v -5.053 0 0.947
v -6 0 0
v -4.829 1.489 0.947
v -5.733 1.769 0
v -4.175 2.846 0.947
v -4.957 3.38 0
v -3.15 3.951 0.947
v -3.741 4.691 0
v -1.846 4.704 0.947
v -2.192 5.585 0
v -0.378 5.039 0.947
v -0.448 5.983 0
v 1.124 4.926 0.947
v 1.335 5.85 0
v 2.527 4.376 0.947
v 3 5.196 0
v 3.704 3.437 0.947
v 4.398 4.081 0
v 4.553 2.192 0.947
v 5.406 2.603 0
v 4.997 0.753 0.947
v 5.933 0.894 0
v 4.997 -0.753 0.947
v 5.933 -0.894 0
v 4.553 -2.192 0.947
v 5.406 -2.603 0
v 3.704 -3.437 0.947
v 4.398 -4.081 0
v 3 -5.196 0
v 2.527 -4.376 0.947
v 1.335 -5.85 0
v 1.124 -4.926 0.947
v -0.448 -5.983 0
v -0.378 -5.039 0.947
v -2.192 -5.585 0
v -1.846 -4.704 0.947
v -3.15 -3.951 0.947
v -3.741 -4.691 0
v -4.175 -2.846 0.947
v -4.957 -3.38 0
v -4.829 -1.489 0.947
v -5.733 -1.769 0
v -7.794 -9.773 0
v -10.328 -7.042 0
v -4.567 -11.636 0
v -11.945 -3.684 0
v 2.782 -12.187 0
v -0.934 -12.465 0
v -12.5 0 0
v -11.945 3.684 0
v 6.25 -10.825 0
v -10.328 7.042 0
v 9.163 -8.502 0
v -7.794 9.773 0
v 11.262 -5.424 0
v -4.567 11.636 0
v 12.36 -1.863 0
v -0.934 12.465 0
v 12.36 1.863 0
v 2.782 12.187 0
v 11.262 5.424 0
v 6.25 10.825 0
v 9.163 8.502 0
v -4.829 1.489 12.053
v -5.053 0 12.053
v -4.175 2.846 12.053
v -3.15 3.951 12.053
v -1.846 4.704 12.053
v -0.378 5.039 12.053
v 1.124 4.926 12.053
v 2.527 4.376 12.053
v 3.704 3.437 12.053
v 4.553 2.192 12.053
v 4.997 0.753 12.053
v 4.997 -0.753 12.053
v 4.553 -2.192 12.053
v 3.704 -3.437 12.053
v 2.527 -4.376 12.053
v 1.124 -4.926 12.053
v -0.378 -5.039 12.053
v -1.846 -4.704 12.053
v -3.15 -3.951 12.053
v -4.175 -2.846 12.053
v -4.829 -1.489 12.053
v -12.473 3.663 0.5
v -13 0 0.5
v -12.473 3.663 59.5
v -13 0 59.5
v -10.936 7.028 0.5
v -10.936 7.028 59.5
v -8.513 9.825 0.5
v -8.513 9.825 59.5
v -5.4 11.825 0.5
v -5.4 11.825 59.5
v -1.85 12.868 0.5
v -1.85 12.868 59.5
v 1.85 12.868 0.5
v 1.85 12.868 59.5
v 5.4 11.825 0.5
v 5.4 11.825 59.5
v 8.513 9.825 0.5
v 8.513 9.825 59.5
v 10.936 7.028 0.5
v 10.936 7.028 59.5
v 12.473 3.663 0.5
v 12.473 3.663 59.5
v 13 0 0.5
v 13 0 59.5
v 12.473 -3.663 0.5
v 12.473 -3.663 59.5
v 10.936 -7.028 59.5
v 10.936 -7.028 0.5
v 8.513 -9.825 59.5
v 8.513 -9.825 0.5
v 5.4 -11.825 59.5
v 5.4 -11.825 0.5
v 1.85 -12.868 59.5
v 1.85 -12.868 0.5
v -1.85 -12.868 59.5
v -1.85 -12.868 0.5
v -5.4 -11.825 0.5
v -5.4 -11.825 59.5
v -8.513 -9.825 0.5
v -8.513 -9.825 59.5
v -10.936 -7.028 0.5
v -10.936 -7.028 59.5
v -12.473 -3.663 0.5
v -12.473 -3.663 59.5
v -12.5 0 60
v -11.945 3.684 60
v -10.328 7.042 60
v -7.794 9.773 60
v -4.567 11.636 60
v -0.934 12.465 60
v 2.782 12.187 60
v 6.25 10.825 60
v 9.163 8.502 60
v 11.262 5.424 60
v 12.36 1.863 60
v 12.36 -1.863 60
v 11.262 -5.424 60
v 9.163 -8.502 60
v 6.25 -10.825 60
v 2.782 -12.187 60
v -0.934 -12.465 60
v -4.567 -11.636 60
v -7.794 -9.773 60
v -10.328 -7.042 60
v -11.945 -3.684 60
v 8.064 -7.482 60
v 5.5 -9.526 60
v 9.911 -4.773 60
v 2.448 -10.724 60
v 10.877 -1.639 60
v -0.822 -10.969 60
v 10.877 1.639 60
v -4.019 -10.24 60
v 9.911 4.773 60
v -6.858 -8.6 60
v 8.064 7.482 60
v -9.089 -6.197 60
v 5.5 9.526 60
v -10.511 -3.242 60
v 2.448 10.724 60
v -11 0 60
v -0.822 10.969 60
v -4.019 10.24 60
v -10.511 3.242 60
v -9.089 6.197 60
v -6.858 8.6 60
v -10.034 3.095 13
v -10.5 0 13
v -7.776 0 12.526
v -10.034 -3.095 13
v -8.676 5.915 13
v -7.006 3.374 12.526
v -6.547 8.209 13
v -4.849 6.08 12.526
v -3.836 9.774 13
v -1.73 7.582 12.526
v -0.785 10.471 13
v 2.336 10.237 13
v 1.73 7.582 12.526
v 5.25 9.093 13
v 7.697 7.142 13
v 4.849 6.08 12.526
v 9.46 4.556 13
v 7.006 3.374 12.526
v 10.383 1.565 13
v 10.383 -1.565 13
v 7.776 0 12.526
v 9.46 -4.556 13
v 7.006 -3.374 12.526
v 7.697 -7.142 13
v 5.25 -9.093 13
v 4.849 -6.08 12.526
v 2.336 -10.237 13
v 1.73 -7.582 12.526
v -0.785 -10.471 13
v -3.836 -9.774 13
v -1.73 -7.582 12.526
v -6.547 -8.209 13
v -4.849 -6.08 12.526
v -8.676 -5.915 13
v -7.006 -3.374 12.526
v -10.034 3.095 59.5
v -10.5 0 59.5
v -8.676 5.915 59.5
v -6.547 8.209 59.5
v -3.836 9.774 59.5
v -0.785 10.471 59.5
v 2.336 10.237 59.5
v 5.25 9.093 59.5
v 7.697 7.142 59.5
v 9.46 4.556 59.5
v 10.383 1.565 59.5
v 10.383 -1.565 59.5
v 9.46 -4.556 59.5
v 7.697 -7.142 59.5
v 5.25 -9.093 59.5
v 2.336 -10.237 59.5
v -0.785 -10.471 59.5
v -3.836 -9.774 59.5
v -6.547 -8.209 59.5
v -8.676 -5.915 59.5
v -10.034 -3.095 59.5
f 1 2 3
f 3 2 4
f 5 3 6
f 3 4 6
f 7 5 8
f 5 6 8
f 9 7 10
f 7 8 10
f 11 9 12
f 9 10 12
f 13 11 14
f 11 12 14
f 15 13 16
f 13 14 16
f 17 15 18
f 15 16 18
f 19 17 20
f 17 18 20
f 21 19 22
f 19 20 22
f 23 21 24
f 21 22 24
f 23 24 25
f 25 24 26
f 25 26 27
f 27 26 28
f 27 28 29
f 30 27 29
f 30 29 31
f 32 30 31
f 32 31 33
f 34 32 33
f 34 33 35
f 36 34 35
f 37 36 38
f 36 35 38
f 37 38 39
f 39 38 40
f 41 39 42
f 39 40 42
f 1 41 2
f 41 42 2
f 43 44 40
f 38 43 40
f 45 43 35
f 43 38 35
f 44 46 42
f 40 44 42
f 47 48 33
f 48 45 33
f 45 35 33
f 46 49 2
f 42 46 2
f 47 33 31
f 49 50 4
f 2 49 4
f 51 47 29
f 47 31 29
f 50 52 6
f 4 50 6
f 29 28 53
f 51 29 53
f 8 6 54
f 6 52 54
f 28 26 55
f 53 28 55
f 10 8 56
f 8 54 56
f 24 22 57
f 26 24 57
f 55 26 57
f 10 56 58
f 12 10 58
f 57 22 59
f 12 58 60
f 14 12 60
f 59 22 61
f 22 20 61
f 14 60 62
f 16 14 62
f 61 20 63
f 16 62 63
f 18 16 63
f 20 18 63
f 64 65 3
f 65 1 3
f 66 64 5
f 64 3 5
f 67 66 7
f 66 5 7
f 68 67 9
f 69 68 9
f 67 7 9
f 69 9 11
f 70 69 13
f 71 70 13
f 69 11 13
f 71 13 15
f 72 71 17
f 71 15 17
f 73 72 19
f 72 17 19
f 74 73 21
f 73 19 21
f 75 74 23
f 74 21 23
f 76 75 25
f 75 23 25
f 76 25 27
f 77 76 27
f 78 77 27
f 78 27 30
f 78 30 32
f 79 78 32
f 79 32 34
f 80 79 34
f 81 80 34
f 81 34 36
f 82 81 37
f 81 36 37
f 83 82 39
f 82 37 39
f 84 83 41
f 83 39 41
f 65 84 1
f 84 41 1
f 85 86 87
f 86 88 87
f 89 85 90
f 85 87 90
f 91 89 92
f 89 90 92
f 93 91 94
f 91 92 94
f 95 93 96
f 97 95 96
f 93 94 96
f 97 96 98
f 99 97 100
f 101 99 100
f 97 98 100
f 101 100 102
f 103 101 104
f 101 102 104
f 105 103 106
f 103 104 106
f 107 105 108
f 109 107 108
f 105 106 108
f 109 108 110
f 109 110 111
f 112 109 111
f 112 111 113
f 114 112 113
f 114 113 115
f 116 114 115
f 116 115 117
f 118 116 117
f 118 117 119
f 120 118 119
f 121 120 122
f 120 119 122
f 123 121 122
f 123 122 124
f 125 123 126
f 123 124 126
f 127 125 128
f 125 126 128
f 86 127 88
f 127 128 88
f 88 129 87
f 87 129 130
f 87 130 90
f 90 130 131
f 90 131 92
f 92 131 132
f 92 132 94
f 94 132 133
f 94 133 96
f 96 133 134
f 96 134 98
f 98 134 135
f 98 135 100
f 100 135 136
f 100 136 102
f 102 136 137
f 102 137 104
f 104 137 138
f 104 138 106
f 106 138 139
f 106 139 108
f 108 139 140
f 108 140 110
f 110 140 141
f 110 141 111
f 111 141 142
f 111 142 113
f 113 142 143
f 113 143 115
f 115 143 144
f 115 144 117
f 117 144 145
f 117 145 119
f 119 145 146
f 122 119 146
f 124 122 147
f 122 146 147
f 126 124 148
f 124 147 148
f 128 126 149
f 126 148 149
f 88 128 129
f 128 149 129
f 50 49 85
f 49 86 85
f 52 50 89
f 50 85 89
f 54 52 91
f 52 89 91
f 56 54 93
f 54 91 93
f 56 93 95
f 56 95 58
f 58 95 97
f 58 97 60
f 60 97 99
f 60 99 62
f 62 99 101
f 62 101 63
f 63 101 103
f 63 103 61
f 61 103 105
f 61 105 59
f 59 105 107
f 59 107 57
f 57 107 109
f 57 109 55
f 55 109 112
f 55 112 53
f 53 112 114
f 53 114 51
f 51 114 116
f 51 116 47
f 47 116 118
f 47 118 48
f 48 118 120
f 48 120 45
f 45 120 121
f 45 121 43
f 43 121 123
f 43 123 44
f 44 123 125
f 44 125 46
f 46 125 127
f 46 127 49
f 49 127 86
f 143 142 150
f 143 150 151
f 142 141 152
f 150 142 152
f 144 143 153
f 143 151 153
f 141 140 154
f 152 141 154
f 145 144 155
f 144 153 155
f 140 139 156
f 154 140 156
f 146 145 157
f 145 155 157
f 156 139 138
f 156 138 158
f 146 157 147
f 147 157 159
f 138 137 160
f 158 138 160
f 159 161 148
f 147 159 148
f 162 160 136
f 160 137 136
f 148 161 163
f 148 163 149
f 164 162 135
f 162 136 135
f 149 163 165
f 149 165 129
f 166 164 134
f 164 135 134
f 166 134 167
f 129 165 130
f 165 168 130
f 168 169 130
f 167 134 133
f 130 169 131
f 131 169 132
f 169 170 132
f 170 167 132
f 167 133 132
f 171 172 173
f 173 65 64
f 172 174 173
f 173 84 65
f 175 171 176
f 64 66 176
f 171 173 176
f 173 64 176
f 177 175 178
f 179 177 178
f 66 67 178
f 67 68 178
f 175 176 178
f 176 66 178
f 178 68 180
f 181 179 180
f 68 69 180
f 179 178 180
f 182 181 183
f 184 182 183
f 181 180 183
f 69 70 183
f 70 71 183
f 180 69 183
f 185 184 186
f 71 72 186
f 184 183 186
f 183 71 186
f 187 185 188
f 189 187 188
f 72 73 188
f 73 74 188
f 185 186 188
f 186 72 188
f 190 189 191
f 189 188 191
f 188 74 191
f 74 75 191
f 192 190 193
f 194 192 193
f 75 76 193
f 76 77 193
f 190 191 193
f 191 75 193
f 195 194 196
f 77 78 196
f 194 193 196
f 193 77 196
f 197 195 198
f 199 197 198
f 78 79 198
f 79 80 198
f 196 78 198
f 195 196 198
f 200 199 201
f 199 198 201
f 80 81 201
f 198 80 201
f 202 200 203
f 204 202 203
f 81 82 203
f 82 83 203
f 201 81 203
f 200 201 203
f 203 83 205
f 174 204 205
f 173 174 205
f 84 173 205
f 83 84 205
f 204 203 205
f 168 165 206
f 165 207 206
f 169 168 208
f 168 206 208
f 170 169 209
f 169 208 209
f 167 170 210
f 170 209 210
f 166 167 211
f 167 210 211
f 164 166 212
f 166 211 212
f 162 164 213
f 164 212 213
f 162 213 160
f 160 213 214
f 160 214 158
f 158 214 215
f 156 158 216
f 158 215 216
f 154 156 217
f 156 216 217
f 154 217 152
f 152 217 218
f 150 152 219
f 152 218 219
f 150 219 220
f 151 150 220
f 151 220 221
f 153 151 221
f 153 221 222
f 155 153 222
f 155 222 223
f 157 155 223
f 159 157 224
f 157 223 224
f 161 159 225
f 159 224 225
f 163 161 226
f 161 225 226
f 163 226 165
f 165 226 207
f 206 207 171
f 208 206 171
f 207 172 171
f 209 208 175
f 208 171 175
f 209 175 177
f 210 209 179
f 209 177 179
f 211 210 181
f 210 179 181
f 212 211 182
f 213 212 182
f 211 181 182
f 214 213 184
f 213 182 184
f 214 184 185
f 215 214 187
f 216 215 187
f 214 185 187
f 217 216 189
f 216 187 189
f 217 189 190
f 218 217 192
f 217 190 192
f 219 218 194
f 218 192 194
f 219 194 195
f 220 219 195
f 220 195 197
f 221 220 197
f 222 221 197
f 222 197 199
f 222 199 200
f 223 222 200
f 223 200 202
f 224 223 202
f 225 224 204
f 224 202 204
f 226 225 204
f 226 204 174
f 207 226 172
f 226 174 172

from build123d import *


with BuildPart() as part:
    # Эскиз1 → Повернуть1 (revolve)
    with BuildSketch(Plane.XZ, mode=Mode.PRIVATE) as revolve_1_sk:
        Polygon((5.053, 0.947), (6, 0), (12.5, 0), (13, 0.5), (13, 59.5), (12.5, 60), (11, 60), (10.5, 59.5), (10.5, 13), (5.053, 12.053), align=None)
    revolve(revolve_1_sk.sketch.rotate(Axis((0, 0, 60.005), (0, 0, -1)), 180), axis=Axis((0, 0, 60.005), (0, 0, -1)))


solid = part.part
